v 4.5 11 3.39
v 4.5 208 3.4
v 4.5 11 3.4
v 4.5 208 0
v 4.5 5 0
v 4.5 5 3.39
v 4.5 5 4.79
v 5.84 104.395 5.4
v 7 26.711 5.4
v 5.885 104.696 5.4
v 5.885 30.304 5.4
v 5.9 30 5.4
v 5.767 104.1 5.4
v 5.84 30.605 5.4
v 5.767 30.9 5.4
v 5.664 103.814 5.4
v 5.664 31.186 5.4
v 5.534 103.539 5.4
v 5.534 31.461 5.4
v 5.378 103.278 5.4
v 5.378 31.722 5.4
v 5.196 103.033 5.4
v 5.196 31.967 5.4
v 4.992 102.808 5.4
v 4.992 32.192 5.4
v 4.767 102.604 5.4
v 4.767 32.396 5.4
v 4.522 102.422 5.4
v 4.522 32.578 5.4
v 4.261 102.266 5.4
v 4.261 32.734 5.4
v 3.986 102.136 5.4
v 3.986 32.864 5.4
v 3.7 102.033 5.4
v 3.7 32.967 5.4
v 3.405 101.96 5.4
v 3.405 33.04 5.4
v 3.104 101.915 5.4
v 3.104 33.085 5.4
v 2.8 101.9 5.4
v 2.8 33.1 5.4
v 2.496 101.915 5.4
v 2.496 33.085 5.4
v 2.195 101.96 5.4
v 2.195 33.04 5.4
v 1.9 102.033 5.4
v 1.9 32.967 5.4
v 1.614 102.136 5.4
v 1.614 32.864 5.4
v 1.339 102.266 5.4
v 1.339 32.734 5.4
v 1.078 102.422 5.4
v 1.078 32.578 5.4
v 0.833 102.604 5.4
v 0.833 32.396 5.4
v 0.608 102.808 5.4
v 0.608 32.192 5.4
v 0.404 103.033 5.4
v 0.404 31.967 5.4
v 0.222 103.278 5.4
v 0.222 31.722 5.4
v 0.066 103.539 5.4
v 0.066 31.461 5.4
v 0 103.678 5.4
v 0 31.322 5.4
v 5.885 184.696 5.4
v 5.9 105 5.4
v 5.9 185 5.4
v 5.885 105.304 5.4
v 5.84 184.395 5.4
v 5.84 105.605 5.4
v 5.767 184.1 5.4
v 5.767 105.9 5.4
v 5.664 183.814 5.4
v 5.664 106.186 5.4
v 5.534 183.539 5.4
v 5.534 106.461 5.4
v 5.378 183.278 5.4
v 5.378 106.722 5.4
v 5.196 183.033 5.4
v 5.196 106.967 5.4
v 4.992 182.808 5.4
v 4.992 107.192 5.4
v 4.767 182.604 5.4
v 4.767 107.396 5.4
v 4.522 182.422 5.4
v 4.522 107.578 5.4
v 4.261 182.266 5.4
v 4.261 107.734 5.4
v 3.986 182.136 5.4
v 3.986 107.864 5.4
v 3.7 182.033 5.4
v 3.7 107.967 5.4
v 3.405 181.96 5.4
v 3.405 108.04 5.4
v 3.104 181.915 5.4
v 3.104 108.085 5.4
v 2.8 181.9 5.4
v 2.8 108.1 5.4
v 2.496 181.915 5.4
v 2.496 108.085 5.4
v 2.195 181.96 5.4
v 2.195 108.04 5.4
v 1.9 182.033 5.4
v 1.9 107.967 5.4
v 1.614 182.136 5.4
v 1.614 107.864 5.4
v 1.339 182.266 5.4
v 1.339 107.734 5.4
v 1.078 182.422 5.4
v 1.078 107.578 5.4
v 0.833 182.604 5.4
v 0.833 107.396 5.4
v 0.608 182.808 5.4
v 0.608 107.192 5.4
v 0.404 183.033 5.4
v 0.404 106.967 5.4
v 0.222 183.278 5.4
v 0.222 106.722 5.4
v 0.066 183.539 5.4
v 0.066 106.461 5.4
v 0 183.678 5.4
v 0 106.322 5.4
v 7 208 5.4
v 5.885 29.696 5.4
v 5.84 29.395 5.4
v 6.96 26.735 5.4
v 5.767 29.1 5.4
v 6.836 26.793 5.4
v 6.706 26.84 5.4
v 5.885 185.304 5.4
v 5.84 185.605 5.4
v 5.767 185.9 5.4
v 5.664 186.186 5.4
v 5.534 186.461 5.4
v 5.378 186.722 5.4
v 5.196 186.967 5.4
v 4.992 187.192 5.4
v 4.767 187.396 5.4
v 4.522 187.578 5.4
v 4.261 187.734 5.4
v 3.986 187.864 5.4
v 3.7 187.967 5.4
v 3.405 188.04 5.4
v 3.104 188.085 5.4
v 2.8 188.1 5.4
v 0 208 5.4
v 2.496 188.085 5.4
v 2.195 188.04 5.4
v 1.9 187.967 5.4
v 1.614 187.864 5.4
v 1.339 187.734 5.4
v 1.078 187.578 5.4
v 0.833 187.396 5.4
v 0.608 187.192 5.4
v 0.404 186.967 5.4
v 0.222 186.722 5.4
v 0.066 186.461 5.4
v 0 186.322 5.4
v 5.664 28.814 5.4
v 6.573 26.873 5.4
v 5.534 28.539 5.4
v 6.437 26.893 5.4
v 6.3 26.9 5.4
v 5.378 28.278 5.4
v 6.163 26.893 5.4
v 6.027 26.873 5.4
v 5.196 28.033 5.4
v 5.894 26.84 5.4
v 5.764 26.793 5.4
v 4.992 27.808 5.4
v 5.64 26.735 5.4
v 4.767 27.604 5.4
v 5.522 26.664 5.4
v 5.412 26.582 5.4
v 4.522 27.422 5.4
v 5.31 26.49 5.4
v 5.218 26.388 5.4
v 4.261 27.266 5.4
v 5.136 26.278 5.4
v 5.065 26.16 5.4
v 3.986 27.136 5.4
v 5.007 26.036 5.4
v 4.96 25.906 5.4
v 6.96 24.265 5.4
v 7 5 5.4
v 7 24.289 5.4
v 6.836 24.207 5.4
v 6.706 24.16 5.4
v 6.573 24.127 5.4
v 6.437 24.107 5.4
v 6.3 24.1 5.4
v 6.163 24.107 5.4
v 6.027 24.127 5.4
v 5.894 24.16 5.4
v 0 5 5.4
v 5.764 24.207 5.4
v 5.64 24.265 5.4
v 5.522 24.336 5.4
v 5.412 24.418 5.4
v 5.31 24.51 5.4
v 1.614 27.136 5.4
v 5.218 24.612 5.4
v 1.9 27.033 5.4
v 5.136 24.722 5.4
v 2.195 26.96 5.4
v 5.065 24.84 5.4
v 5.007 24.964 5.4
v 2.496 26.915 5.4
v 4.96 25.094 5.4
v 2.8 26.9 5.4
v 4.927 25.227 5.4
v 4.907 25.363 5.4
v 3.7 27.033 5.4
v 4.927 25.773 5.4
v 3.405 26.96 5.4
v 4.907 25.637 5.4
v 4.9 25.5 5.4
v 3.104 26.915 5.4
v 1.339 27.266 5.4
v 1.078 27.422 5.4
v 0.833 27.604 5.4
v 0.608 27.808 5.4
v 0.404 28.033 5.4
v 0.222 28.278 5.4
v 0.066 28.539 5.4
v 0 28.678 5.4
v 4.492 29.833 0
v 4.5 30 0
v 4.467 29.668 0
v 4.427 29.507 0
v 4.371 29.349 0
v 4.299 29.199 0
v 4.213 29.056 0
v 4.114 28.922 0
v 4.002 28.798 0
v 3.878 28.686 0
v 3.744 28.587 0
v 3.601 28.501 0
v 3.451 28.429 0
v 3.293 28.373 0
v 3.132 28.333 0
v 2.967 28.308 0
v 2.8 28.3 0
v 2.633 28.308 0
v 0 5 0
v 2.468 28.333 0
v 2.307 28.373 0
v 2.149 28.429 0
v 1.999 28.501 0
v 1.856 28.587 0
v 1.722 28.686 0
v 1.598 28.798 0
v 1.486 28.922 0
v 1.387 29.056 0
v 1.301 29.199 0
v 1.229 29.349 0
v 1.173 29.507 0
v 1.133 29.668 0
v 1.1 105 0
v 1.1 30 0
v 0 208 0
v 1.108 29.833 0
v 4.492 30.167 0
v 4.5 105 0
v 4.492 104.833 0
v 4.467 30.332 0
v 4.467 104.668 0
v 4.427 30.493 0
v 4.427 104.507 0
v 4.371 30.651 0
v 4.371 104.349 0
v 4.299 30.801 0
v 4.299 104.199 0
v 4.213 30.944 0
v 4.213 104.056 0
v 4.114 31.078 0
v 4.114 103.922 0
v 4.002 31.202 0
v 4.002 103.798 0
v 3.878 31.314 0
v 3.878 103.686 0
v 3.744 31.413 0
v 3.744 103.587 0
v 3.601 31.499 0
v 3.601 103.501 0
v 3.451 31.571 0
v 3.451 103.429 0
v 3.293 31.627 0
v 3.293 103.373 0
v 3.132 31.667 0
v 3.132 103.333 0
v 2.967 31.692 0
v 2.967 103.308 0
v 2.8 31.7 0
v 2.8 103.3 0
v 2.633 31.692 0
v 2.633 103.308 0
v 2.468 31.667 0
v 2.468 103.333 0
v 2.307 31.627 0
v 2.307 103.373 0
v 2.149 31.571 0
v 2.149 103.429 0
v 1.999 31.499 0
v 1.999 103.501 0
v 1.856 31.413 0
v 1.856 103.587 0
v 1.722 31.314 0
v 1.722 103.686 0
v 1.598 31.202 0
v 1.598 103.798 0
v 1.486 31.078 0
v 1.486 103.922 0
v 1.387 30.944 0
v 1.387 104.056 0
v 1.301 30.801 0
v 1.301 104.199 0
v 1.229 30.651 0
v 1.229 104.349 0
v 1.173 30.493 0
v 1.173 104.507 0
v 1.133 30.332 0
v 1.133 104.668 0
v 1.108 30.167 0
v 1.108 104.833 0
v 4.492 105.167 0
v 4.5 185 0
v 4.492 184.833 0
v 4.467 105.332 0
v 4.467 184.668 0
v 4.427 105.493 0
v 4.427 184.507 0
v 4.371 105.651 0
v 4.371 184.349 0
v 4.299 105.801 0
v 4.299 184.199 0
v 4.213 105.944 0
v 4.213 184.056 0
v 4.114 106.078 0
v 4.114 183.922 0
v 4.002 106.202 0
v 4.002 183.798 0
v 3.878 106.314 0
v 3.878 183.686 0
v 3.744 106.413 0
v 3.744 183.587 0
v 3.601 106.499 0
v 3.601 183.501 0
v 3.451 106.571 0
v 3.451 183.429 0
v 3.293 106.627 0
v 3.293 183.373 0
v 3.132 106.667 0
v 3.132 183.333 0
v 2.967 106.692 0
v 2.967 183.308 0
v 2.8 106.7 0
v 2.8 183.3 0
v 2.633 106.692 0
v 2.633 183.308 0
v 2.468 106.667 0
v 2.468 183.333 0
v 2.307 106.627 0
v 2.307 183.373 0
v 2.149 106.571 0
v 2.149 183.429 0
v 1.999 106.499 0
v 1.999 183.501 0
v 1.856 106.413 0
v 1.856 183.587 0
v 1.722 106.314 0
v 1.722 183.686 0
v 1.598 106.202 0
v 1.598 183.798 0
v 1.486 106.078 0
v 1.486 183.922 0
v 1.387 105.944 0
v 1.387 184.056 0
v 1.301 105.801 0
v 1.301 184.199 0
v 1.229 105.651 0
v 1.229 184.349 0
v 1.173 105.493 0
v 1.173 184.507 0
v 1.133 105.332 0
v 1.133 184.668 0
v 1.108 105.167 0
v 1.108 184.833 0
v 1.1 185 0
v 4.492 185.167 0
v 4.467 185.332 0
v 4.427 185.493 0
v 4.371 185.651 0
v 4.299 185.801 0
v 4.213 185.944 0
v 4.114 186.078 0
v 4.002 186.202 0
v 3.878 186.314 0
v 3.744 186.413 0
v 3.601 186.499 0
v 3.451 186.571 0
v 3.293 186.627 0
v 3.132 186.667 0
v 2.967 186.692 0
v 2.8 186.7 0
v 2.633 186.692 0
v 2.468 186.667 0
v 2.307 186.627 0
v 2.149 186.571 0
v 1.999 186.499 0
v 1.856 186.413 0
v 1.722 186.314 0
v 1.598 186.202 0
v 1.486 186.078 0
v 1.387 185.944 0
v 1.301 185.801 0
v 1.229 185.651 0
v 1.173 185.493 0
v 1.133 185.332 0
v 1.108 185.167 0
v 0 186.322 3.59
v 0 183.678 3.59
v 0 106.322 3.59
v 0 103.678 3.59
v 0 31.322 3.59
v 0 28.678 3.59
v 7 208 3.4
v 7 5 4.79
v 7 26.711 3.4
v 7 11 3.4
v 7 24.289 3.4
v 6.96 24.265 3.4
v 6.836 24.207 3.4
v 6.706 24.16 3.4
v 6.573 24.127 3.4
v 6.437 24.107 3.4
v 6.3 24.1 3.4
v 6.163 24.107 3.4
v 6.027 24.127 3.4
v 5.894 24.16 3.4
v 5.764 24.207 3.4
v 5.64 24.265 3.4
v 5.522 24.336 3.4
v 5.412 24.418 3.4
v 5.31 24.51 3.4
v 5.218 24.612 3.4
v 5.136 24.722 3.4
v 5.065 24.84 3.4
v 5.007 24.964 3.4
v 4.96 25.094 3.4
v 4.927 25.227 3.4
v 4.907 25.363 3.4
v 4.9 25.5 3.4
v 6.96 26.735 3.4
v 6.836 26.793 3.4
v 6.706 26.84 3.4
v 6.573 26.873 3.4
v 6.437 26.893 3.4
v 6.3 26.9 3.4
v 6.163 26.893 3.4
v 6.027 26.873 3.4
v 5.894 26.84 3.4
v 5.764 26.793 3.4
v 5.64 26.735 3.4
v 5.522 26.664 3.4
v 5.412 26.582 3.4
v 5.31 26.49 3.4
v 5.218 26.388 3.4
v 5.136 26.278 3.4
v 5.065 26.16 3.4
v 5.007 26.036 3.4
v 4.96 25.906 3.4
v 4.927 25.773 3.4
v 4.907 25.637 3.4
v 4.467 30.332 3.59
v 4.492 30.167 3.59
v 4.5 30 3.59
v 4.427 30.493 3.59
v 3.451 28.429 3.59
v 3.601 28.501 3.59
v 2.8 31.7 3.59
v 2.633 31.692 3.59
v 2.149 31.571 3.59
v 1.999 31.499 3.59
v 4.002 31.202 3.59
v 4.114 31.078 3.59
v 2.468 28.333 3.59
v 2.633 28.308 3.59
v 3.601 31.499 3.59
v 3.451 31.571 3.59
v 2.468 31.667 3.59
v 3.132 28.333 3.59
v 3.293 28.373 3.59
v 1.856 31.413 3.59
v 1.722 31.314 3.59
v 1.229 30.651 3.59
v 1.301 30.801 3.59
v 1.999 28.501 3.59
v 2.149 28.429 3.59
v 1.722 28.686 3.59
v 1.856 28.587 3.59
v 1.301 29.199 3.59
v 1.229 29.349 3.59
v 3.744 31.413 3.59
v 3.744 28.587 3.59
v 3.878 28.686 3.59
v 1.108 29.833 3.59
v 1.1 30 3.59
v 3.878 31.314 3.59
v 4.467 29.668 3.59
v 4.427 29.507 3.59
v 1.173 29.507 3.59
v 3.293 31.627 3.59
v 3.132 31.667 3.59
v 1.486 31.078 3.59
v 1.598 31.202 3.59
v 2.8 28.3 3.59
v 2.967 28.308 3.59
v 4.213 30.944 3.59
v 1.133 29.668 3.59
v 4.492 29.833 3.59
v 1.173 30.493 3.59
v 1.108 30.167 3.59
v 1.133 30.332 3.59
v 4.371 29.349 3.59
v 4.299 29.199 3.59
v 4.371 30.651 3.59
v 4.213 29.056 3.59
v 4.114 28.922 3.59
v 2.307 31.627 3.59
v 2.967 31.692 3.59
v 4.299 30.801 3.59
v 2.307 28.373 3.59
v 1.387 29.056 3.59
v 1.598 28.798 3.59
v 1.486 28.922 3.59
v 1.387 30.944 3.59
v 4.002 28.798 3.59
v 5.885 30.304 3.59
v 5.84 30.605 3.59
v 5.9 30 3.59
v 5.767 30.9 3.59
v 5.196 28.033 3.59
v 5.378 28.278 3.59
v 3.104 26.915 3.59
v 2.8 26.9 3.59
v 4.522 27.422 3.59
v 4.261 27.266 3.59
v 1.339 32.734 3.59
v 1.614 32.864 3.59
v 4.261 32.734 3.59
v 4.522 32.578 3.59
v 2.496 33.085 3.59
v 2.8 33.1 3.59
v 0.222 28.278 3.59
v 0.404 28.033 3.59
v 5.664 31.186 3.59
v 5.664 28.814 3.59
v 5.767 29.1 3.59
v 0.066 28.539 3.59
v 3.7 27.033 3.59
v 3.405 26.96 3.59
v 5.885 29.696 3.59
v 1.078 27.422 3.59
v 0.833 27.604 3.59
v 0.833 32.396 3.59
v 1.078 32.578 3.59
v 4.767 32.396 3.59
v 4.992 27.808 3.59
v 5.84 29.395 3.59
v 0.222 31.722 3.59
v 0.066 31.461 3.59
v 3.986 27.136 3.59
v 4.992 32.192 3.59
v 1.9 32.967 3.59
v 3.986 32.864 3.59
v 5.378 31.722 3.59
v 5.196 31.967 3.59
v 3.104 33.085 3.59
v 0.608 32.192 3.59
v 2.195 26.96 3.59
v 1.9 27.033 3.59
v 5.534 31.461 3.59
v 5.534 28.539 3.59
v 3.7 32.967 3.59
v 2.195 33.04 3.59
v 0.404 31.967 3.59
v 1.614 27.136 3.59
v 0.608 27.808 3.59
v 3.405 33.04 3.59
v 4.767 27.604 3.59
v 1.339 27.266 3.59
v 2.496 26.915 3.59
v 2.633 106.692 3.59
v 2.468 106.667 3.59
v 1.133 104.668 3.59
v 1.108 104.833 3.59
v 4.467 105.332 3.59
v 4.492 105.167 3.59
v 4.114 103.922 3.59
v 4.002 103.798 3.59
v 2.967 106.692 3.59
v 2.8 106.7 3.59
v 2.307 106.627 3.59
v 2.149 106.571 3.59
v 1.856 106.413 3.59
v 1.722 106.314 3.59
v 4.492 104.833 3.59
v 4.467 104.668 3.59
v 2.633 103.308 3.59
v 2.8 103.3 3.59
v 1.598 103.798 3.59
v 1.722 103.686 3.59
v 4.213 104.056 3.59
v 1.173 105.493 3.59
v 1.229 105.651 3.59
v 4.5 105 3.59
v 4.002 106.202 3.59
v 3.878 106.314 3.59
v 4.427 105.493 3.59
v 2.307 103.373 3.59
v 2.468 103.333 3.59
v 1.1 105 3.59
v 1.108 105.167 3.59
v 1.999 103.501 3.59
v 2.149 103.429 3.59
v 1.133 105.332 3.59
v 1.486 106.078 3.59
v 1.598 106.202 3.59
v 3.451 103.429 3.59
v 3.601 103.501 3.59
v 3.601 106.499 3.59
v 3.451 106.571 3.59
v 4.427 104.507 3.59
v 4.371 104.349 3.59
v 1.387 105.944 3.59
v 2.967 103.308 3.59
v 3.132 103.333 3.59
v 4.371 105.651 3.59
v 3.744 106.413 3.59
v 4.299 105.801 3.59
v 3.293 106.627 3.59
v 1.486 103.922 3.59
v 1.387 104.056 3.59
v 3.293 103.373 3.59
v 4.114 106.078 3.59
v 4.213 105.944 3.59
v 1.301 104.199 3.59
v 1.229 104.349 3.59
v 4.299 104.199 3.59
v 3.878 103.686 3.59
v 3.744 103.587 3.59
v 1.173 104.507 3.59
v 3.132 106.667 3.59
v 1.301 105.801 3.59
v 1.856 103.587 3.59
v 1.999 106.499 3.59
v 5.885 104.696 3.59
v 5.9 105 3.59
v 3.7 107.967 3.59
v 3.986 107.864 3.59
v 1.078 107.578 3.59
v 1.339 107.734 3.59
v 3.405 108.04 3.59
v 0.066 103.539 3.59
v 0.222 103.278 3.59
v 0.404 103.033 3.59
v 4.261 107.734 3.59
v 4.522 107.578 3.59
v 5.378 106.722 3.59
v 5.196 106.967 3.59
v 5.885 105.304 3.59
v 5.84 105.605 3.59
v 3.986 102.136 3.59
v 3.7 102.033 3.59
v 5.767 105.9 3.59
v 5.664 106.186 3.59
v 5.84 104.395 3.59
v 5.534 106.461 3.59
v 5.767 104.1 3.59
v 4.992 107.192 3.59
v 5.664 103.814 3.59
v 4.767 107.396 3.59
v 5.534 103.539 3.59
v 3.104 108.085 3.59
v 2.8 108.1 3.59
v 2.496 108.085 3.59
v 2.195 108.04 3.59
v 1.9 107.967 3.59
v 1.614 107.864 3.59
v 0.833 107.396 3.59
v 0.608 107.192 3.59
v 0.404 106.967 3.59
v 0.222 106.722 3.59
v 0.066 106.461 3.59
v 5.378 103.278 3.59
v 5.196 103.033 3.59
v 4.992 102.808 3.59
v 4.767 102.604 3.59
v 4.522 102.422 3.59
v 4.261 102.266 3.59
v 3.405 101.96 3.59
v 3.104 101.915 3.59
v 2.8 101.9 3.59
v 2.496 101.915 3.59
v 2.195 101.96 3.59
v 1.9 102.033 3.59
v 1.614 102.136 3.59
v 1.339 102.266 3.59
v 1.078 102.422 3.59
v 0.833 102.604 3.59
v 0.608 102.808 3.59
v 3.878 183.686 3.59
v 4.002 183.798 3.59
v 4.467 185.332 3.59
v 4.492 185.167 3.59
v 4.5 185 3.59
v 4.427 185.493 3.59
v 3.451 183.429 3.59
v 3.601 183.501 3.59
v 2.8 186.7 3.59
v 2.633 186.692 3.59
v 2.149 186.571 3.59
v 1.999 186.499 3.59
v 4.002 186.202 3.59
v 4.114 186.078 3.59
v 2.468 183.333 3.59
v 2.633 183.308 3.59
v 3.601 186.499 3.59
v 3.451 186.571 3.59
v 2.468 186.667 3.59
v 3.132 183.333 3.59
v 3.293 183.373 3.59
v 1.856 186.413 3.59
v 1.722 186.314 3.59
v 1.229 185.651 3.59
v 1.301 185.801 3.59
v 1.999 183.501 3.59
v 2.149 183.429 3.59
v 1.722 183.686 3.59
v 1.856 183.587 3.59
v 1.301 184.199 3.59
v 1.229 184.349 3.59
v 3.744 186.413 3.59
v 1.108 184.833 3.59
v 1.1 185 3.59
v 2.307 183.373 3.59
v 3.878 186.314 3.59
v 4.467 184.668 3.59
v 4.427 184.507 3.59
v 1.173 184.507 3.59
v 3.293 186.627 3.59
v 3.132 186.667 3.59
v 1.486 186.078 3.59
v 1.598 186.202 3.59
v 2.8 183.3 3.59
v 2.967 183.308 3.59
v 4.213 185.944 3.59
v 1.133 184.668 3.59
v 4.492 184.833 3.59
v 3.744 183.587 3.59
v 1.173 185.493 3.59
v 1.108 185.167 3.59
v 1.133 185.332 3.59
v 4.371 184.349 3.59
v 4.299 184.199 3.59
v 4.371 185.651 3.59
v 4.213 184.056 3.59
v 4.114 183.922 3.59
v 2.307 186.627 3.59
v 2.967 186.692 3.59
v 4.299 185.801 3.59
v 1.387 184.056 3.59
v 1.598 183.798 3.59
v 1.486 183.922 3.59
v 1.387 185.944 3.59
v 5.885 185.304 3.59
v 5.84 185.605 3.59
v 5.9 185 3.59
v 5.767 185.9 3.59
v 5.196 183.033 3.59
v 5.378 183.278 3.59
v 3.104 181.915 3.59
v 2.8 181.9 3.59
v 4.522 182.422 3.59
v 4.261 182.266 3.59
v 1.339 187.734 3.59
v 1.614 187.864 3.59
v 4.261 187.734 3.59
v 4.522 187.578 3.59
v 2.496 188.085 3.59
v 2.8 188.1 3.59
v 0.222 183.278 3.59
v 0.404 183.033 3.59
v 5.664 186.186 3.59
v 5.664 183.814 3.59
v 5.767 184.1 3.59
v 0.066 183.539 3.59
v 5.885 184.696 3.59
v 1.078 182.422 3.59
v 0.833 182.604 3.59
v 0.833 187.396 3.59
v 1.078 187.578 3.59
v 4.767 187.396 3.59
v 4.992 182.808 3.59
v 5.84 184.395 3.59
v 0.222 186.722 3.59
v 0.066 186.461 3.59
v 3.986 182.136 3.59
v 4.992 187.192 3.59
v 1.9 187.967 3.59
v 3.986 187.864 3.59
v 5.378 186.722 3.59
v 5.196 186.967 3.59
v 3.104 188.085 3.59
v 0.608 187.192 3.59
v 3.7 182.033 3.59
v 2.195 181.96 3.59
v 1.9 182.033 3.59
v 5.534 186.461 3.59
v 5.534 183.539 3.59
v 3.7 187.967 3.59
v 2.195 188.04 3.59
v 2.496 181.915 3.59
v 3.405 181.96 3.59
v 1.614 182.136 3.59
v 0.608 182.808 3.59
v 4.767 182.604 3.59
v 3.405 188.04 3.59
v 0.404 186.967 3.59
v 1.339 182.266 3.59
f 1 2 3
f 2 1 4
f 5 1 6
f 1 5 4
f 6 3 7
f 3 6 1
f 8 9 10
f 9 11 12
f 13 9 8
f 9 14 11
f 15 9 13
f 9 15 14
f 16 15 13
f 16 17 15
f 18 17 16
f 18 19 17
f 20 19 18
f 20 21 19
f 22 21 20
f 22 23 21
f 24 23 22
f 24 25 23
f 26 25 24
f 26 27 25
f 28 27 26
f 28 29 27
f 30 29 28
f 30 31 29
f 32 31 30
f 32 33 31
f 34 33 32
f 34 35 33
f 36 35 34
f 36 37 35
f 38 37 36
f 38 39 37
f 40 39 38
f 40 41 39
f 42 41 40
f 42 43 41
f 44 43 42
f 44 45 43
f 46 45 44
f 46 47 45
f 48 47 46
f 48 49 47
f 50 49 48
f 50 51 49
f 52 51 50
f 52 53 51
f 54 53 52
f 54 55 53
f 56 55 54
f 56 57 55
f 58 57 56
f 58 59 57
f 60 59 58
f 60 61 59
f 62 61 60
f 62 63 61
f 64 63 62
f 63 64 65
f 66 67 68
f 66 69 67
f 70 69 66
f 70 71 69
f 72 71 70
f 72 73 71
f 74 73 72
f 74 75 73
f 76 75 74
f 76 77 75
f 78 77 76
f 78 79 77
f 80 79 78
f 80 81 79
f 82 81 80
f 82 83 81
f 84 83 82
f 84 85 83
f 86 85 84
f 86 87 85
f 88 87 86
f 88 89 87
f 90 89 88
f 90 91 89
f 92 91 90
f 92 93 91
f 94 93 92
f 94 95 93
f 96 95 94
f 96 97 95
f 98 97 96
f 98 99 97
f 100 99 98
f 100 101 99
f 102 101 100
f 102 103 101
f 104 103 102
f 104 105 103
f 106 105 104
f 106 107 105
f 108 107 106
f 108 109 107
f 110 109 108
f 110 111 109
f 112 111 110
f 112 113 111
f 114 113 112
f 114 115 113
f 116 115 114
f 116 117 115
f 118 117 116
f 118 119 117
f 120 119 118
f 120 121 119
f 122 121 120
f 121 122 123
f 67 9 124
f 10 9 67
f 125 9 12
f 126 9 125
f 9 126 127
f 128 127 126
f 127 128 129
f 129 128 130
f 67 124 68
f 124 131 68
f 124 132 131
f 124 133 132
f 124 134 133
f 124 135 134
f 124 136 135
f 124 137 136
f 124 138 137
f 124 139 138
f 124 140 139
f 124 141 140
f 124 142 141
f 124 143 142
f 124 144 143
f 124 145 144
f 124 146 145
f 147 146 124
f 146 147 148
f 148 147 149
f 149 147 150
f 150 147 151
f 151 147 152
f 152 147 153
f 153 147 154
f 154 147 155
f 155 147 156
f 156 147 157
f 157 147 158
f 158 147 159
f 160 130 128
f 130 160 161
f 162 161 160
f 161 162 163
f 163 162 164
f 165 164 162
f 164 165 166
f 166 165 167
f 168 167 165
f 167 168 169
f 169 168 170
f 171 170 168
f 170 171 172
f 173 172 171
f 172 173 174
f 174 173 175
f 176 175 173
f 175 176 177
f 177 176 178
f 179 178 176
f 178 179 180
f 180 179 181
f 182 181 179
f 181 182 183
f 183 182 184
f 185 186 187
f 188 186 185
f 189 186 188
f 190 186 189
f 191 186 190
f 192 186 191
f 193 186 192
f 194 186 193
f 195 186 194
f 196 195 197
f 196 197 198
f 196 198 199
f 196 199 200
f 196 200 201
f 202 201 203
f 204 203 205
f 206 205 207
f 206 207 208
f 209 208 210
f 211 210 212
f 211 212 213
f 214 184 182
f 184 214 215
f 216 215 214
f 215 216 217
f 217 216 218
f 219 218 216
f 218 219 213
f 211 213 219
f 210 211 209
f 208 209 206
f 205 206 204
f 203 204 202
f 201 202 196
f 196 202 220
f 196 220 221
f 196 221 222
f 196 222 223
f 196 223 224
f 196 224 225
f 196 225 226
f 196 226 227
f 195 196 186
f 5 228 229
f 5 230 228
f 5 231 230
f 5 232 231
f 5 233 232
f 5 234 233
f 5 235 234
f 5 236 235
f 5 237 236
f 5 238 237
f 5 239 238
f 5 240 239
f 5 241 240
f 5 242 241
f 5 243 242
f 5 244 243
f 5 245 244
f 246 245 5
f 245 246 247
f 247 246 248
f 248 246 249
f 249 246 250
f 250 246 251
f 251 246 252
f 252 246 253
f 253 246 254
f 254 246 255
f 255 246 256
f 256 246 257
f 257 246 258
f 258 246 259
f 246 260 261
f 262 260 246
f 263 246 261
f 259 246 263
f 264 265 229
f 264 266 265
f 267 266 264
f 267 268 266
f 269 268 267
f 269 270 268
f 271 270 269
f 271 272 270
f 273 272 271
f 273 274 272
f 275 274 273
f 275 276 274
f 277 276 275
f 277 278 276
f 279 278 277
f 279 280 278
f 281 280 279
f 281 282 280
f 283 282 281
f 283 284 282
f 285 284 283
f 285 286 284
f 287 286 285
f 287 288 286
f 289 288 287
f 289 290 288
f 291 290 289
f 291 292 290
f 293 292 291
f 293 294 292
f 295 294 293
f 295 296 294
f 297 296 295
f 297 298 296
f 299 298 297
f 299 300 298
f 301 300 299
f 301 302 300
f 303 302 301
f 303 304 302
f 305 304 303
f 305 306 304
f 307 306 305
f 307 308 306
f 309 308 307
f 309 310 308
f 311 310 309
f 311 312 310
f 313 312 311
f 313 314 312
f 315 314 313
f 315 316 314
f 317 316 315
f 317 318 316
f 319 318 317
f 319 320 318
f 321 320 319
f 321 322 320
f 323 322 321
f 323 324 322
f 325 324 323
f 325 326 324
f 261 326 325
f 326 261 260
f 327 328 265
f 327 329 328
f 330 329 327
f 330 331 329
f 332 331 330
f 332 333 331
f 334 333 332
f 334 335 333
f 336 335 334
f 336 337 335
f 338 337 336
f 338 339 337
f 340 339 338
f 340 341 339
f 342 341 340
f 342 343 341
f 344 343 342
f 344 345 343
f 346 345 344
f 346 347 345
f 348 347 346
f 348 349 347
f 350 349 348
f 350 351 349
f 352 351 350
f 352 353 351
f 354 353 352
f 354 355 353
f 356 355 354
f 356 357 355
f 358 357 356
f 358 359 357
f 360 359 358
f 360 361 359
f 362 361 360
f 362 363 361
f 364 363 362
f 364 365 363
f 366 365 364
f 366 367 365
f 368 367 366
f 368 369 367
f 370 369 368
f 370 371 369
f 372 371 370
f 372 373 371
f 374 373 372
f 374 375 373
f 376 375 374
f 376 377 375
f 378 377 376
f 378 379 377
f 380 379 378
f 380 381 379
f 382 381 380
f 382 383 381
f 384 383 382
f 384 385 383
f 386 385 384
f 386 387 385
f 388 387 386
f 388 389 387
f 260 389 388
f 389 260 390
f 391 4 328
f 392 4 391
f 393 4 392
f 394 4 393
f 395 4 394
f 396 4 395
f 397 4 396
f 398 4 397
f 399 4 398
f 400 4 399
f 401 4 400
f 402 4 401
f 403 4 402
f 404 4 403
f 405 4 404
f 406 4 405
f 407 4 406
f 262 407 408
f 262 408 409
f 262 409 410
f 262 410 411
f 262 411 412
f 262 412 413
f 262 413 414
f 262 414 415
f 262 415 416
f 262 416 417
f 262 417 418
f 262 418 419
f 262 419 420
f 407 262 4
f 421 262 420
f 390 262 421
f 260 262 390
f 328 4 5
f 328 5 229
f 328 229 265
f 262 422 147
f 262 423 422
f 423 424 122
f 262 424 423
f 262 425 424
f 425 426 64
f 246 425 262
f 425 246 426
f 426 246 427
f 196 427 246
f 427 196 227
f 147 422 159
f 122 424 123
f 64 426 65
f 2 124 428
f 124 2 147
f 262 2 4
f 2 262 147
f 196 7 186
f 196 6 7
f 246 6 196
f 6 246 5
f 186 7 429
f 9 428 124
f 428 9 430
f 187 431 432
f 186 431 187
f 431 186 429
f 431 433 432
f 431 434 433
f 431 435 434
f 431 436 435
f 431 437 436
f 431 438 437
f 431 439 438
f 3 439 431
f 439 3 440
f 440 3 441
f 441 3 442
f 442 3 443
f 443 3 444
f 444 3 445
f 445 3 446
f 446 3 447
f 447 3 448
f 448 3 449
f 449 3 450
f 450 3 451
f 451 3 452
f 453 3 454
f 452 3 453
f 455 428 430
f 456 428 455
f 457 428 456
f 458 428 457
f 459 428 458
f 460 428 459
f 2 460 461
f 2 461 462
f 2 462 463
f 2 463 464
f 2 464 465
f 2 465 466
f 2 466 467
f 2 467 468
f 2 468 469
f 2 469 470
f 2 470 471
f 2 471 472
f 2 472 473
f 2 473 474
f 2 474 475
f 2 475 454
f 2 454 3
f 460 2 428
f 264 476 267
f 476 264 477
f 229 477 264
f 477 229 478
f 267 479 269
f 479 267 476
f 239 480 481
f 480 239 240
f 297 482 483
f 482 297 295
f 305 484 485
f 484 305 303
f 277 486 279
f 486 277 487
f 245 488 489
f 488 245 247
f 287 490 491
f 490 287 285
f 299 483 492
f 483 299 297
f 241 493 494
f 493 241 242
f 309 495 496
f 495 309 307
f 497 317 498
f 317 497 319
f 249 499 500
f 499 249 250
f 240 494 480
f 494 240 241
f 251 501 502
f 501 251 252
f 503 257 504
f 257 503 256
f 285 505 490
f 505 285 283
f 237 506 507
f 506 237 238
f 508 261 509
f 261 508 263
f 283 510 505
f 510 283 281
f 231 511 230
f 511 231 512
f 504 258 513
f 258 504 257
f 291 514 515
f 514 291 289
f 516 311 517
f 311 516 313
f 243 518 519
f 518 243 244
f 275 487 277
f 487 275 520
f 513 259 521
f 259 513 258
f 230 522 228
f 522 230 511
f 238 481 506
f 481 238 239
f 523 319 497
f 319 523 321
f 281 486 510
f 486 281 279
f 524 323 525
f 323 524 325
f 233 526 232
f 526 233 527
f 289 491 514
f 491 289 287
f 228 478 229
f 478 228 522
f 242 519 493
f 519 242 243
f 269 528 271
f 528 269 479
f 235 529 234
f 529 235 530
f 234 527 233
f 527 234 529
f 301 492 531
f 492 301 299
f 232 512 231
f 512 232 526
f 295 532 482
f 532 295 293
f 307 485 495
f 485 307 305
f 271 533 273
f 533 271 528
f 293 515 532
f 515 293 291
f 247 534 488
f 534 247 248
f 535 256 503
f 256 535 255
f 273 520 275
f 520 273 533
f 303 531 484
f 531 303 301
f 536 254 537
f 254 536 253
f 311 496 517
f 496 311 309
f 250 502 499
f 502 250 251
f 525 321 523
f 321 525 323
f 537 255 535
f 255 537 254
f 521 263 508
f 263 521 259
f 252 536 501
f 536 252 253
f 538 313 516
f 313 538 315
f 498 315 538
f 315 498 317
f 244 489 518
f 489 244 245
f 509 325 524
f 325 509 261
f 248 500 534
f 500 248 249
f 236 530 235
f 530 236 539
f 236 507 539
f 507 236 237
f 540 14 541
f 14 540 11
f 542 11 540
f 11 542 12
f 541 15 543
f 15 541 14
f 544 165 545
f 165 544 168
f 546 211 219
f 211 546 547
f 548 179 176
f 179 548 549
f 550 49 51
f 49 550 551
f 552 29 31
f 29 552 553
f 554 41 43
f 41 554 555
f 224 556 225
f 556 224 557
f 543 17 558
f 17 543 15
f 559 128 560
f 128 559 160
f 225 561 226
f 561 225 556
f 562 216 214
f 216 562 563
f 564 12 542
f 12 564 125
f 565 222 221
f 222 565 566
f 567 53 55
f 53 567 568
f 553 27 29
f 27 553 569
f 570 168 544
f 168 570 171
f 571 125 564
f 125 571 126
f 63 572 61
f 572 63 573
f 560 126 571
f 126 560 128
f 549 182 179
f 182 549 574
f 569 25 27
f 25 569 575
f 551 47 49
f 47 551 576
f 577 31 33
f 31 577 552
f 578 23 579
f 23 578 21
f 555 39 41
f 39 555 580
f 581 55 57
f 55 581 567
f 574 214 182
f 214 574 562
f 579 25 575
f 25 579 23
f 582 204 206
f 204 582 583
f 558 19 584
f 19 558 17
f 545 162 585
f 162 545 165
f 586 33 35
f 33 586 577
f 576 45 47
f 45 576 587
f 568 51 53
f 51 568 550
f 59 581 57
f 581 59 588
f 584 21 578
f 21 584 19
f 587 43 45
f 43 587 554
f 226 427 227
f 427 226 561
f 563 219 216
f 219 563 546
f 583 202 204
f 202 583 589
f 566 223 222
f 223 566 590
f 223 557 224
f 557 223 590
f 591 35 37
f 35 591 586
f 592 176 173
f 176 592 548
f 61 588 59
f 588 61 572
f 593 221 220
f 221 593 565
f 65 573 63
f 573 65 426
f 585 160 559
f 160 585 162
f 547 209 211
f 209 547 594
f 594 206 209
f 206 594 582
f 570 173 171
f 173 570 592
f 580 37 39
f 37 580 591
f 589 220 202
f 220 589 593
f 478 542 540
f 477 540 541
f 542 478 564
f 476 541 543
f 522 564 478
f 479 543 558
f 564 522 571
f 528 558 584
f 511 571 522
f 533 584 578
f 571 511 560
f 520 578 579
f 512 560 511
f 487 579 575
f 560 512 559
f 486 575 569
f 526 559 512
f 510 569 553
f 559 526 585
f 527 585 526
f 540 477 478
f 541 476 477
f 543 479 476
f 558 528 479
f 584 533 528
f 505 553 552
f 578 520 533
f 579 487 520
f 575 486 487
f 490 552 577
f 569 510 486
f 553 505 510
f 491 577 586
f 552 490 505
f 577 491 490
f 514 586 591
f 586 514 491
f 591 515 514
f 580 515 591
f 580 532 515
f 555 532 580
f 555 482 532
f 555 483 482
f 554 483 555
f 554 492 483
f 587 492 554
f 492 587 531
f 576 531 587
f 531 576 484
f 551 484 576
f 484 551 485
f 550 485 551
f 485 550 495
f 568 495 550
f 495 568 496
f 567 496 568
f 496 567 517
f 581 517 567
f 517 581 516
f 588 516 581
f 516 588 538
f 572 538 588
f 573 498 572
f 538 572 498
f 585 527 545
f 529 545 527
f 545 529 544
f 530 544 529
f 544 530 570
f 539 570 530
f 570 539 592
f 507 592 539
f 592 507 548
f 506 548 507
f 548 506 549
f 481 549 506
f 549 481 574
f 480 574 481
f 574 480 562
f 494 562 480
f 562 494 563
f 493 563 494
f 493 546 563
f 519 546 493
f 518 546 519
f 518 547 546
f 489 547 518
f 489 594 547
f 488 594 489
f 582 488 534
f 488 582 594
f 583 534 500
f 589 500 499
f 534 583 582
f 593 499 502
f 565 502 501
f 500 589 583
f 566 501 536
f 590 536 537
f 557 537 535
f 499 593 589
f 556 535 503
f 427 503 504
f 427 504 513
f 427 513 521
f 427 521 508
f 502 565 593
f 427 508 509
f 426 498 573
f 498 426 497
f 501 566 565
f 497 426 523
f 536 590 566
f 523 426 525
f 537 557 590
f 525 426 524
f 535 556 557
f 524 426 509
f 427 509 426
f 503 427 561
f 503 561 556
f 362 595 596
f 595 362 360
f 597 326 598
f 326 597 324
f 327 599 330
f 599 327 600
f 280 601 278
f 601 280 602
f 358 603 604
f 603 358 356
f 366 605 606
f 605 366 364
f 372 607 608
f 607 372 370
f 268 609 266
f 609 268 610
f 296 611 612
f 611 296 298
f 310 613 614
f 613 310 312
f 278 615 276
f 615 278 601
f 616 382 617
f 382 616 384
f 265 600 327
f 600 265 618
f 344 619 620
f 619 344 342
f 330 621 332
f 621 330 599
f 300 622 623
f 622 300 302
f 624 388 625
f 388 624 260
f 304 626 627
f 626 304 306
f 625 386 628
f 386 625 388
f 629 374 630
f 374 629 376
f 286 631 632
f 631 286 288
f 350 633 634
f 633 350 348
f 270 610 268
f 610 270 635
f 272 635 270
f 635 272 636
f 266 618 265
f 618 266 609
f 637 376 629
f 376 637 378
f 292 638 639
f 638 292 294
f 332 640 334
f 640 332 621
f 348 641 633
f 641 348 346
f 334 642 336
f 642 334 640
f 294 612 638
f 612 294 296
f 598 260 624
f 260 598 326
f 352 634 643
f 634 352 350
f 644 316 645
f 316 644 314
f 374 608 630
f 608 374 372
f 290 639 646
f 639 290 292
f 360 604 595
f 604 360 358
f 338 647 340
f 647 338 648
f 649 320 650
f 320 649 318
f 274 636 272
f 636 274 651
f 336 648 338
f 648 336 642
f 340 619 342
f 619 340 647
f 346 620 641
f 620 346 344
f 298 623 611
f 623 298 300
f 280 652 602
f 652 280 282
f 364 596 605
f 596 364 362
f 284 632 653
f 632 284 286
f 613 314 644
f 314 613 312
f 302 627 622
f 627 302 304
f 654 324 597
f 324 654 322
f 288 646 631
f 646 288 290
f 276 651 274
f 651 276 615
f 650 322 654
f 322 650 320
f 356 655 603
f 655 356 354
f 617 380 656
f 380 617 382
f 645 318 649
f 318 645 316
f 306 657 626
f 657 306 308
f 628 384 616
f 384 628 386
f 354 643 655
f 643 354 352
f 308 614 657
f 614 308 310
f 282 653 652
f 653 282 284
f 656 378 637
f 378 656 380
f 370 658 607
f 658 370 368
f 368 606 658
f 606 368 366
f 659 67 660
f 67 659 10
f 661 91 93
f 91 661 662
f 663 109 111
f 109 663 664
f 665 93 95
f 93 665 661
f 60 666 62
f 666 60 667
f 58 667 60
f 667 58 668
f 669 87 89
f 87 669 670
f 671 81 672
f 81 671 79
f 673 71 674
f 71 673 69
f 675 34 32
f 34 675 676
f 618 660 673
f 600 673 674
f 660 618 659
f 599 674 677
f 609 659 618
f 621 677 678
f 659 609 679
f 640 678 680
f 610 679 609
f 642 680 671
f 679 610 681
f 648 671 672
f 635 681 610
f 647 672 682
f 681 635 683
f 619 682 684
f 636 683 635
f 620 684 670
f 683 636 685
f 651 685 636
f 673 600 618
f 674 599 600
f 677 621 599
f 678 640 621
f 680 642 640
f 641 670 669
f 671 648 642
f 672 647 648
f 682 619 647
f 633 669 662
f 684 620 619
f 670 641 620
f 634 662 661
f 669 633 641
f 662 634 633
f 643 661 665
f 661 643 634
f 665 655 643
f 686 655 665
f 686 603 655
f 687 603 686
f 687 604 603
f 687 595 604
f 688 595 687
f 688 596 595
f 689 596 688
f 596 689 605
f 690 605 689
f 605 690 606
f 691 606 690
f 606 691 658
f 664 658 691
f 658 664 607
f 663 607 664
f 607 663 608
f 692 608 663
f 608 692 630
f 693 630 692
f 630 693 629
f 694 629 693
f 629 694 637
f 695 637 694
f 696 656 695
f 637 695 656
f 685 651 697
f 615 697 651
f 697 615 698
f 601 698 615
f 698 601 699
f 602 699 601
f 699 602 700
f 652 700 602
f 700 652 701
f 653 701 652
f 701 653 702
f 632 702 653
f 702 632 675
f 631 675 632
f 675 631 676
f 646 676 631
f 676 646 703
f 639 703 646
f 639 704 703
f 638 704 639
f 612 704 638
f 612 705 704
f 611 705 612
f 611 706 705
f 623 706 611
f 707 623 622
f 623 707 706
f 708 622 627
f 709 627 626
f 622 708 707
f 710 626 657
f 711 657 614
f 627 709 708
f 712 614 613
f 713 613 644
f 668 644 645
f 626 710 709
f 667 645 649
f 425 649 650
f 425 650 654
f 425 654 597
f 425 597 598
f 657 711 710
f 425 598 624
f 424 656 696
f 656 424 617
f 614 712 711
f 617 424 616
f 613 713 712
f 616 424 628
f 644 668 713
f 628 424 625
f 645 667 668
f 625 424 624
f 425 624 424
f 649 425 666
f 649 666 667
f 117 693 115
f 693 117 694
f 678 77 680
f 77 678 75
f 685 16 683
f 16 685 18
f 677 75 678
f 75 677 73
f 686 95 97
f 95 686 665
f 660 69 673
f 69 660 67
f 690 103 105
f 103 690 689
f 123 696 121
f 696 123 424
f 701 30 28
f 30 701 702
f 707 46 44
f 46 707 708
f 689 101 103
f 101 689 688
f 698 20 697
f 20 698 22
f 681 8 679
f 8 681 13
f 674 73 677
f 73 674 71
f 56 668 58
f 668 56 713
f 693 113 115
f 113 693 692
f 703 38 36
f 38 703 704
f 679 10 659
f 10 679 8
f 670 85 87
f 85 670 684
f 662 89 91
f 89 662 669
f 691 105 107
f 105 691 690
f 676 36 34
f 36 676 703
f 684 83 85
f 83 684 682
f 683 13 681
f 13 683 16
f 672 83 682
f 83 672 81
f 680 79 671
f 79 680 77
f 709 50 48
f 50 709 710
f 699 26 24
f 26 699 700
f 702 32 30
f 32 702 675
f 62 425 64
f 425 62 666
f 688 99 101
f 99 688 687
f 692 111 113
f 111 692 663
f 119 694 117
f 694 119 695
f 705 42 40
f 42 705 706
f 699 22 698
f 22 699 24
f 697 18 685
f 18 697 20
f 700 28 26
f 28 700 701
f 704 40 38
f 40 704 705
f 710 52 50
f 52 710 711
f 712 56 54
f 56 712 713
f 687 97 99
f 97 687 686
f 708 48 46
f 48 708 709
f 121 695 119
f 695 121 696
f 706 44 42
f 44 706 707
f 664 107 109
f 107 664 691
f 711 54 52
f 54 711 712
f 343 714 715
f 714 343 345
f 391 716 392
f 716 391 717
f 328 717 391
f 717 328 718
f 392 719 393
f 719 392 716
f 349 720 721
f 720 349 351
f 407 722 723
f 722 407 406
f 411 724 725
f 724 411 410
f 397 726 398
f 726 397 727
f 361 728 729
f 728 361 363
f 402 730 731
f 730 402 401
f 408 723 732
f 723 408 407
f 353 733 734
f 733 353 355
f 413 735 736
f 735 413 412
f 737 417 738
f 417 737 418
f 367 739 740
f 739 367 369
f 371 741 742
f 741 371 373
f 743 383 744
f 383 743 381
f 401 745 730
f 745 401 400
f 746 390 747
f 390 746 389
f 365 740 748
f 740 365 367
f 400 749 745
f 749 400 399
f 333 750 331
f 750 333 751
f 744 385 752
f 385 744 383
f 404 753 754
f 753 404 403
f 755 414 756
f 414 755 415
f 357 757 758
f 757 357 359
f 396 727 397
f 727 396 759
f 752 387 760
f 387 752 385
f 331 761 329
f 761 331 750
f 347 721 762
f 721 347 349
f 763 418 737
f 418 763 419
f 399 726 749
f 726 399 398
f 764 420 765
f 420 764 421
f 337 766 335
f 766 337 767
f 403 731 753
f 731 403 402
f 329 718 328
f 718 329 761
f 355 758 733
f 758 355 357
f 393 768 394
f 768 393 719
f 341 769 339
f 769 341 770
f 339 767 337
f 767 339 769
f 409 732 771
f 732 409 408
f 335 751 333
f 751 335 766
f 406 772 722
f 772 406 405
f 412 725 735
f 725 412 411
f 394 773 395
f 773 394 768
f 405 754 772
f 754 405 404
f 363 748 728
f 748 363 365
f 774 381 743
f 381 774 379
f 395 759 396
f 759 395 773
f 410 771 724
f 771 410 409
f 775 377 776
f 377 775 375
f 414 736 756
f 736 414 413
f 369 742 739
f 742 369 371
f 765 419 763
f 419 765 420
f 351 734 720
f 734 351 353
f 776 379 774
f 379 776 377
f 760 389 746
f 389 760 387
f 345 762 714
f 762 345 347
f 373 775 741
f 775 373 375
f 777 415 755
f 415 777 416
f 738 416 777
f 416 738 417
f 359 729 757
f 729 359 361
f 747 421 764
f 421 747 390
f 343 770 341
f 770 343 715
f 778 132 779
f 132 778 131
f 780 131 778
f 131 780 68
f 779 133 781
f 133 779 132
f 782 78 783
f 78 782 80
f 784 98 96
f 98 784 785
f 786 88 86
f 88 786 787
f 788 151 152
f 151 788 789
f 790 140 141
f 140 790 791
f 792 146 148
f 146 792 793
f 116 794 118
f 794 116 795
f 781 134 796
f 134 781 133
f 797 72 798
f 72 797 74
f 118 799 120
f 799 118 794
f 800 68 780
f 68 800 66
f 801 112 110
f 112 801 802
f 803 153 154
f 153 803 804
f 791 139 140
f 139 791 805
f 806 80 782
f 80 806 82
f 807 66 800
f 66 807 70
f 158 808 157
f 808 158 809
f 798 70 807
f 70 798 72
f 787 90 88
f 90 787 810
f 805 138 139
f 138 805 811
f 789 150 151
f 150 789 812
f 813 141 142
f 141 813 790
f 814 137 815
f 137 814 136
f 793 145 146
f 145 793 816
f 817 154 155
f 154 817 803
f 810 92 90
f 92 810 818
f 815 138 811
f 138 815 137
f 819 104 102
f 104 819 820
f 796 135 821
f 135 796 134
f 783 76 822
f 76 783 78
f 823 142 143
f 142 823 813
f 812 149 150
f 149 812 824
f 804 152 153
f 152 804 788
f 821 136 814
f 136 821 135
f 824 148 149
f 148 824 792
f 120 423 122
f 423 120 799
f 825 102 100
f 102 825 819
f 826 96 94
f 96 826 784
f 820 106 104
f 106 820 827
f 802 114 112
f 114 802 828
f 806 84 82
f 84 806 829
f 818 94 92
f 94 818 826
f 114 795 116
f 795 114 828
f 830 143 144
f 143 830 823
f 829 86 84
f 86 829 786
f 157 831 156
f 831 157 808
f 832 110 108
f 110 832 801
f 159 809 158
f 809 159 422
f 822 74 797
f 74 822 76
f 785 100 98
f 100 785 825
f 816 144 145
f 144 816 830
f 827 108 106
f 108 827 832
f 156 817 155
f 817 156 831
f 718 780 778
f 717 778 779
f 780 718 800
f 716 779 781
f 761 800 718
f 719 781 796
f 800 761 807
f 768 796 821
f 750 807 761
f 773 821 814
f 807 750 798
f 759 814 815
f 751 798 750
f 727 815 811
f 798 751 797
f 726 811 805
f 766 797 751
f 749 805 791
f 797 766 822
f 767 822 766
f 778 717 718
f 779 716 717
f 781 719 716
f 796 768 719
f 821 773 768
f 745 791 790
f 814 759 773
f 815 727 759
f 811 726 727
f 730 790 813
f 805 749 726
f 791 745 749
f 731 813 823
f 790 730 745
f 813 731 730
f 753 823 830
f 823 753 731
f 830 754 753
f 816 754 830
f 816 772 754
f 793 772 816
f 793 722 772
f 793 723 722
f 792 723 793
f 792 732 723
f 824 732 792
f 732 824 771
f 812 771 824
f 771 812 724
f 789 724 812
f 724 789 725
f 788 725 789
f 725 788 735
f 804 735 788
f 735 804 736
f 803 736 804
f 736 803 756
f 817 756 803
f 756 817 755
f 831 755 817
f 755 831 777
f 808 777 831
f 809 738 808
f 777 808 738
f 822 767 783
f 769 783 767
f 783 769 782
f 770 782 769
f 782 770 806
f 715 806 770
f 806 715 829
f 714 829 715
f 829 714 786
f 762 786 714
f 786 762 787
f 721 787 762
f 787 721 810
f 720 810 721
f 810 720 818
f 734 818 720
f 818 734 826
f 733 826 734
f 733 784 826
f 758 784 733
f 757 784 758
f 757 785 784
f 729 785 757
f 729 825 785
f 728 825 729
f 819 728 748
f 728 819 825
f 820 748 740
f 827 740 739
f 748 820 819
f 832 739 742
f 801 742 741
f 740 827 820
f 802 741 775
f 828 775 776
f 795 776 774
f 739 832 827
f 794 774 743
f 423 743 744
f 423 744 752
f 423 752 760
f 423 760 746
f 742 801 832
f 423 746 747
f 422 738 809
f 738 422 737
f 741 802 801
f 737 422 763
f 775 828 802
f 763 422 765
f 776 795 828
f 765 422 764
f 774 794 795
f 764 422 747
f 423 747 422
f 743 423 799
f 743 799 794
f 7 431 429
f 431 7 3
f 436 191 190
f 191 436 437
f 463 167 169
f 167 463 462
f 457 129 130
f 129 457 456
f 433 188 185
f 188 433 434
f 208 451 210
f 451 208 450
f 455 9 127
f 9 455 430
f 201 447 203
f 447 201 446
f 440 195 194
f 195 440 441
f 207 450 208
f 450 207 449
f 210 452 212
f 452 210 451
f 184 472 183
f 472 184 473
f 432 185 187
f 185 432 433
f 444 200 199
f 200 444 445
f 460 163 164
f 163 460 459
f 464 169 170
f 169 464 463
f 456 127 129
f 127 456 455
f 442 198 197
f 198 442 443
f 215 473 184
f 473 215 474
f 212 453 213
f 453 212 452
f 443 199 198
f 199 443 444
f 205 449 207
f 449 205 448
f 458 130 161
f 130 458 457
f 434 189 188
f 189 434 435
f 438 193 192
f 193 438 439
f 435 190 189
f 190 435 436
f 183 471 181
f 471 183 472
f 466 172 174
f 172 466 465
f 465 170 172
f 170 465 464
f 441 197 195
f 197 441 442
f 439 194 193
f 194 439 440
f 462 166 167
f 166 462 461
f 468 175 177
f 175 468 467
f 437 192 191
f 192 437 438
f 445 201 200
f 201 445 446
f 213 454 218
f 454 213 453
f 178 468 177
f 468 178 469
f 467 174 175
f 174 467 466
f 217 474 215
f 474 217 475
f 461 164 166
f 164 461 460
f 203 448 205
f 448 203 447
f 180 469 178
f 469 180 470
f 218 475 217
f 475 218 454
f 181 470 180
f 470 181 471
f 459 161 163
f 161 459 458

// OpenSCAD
// file: ../generated/config.scad
// GENERATED by tools/build.py from config/rack.yaml — do not edit.

FRAME_PROFILE = 20;
FRAME_W = 700;
FRAME_D = 225;
FRAME_TILT = 20;
FRAME_ROW_Y0 = 25;
FRAME_BRACKET = 10;
FRAME_INNER_X0 = 30;
FRAME_BASE_H = 80;
FRAME_FOOT_H = 10;
FRAME_TOP_Z = 760;
ROW_IDS = ["A", "B", "C", "D"];
ROW_HEIGHTS = [165, 165, 165, 185];
ROW_LAYOUTS = [[1, 1, 1, 1], [1, 1, 1, 1], [1, 1, 1, 1], [2, 2]];
BAY_PITCH = 160;
BAY_GAP = 2;
CARRIER_W = 158;
CARRIER_D = 210;
CARRIER_BOTTOM = 2.5;
CARRIER_WALL = 2;
CARRIER_STANDOFF = 5;
CARRIER_DECK = 3;
CARRIER_FASCIA = 2.5;
CARRIER_WALL_H = 20.1;
CARRIER_PLENUM = 23.1;
PCB_TO_FLOOR = 14;
CAM_MOUNT = [100, 60, 30];
DRAWER_D = 196;
DRAWER_W = 142;
DRAWER_X0 = 8;
DRAWER_TRAVEL = 140;
DRAWER_GUIDE_W = 7.5;
DRAWER_CLEAR = 0.5;
DRAWER_BOTTOM = 2.5;
DRAWER_WALL = 2;
DRAWER_WALL_H = 16;
DRAWER_FRONT_H = 30;
DRAWER_FRONT_T = 4;
DRAWER_REAR_BAY = 30;
DRAWER_FLANGE = [3, 3];
DRAWER_MAGNET = [6, 3];
PLATE_T = 2.5;
CHAIN_INNER = [7, 7];
CHAIN_OUTER = [11, 10];
CHAIN_R = 18;
CHAIN_FIXED = [104, 90];
CHAIN_MOVING_X = 140;
CHAIN_FOOT_Y = 172;
CHAIN_BEND_Y = 182;
NODE_SIZE = [64, 80];
NODE_T = 1.6;
NODE_HOLES = [[3.5, 3.5], [60.5, 3.5], [3.5, 76.5], [60.5, 76.5]];
NODE_X0 = 4;
NODE_FRONT_Y = 3;
NODE_PCB_TOP = 9.1;
NODE_FRONT = [32, 12, 50];
NODE_VH_Y = 64;
NODE_RIGHT = [24, 40];
NODE_CAM = [64, 11];
HUB_SIZE = [120, 70];
HUB_HOLES = [[4, 4], [116, 4], [4, 66], [116, 66]];
// file: ../lib/common.scad
// Shared helpers for every printed part of hw-testing-rack.
include <../generated/config.scad>

$fn = $preview ? 32 : 64;
EPS = 0.01;

// Heat-set inserts (Ruthex-style).  Hole Ø is the recommended pre-hole.
INSERT_M3 = [4.0, 5.7];    // [hole Ø, depth]
INSERT_M2 = [3.2, 4.0];
INSERT_M25 = [3.6, 4.5];
M3_CLEAR = 3.4;
M5_CLEAR = 5.5;
M3_HEAD = [6.0, 3.0];      // DIN 912 / ISO 7380 head Ø × height (button head ~5.7)

module rbox(size, r = 2, center = false) {
    // Box with rounded vertical edges.
    translate(center ? [-size[0] / 2, -size[1] / 2, 0] : [0, 0, 0])
        hull() for (x = [r, size[0] - r], y = [r, size[1] - r])
            translate([x, y, 0]) cylinder(r = r, h = size[2]);
}

module rslot(len, w, h) {
    // Stadium-shaped slot along X, centred on the origin.
    hull() for (x = [-(len - w) / 2, (len - w) / 2]) translate([x, 0, 0]) cylinder(d = w, h = h);
}

module insert_hole(spec = INSERT_M3) {
    // Pocket for a heat-set insert, opening at z=0 and going -Z.
    translate([0, 0, -spec[1]]) cylinder(d = spec[0], h = spec[1] + EPS);
    translate([0, 0, -0.6]) cylinder(d1 = spec[0], d2 = spec[0] + 0.8, h = 0.6 + EPS);
}

module screw_through(d = M3_CLEAR, h = 20, head = M3_HEAD, counterbore = true) {
    // Clearance hole along +Z from z=0, with an optional counterbore at z=h.
    translate([0, 0, -EPS]) cylinder(d = d, h = h + 2 * EPS);
    if (counterbore) translate([0, 0, h - head[1]]) cylinder(d = head[0] + 0.4, h = head[1] + EPS);
}

module magnet_pocket(d = DRAWER_MAGNET[0], t = DRAWER_MAGNET[1]) {
    // Press-fit/glue pocket for a disc magnet, opening at z=0 going -Z.
    translate([0, 0, -t - 0.2]) cylinder(d = d + 0.25, h = t + 0.2 + EPS);
}

module label_text(txt, size = 6, depth = 0.6, font = "Liberation Sans:style=Bold") {
    linear_extrude(depth) text(txt, size = size, font = font, halign = "center", valign = "center");
}

// 2020 B-type profile, simplified (good enough for previews and clearance checks).
module extrusion2020(len) {
    s = FRAME_PROFILE;
    difference() {
        translate([-s / 2, -s / 2, 0]) cube([s, s, len]);
        for (a = [0, 90, 180, 270]) rotate([0, 0, a])
            translate([s / 2 - 1.8, -3, -EPS]) {
                cube([1.8 + EPS, 6, len + 2 * EPS]);
                translate([-4.2, -2.6, 0]) cube([4.3, 11.2, len + 2 * EPS]);
            }
        translate([0, 0, -EPS]) cylinder(d = 4.2, h = len + 2 * EPS);
    }
}
// file: ../lib/carrier.scad
// Geometry shared by the carrier, deck, drawer, plates, chain parts and the assembly.
// All positions are in CARRIER coordinates (origin = front-left-bottom of one
// bay's carrier, X right, Y towards the back, Z up) unless stated otherwise.
include <common.scad>

WALL = CARRIER_WALL;
BOSS_D = 7.5;

// ---------------------------------------------------------------- bay node PCB
// KiCad coordinates on the node (y = 0 at the REAR edge) → carrier XY.
function node_xy(k) = [NODE_X0 + k[0], NODE_FRONT_Y + (NODE_SIZE[1] - k[1])];
NODE_REAR_Y = NODE_FRONT_Y + NODE_SIZE[1];
VH_NOTCH_Y = node_xy([0, NODE_VH_Y])[1];

// ---------------------------------------------------------------- deck fixings
// Side screws go guide → deck → base wall boss (one screw holds all three).
GUIDE_SCREW_X = 2.8;
function side_screws() = [for (y = [30, 105, 185]) for (x = [GUIDE_SCREW_X, CARRIER_W - GUIDE_SCREW_X]) [x, y]];
// Free-standing pillars under the deck middle (clear of the node and the chain).
function deck_pillars() = [[40, 165], [82, 165], [125, 75]];

// ---------------------------------------------------------------- drawer & guides
DRAWER_Y0 = 0;                                     // closed drawer front face
DRAWER_INNER_W = DRAWER_W - 2 * DRAWER_WALL;
DRAWER_PORT_WALL_Y = DRAWER_D - DRAWER_REAR_BAY;   // inner wall carrying the USB-C ports (drawer coords)
GUIDE_Y0 = DRAWER_FRONT_T + 1;
GUIDE_LIP_Z = DRAWER_FLANGE[1] + 0.4;              // lip underside above the deck
GUIDE_LIP_T = 2.0;
GUIDE_WALL_T = DRAWER_X0 - DRAWER_FLANGE[0] - 0.5;  // solid wall of the C-channel (inner face 0.5 from the flange)
STOP_PIN_X = DRAWER_X0 - DRAWER_FLANGE[0] / 2 - 0.2; // M2.5 stop screw, in the flange path
FLANGE_Y = [DRAWER_D - 26, DRAWER_D - 6];          // rear flange segment (drawer coords)
STOP_Y = FLANGE_Y[0] - DRAWER_TRAVEL - 4.5;        // stop pin position (carrier coords)
DETENT_DRAWER = [22, DRAWER_D - 14];               // magnet in drawer bottom (drawer coords)
DETENT_DECK = [DRAWER_X0 + DETENT_DRAWER[0], DETENT_DRAWER[1]];

// panel-mount USB-C (DATA) and a slot for the optional AUX (JST-SH) pigtail, on the port wall
PORT_X = [DRAWER_W * 0.38, DRAWER_W * 0.62];       // [DATA, AUX]
PORT_Z = DRAWER_BOTTOM + 7;
PORT_EARS = 26;                                    // M3 ear pitch of common panel-mount USB-C extensions

// drawer width for a bay spanning `span` units (wide bays share the node of their left unit)
function drawer_w(span) = span * BAY_PITCH - BAY_GAP - 2 * DRAWER_GUIDE_W - 2 * DRAWER_CLEAR;

// board plate (drops into the drawer between front panel and port wall)
function plate_w(span) = drawer_w(span) - 2 * DRAWER_WALL - 0.6;
PLATE_W = DRAWER_INNER_W - 0.6;
PLATE_D = DRAWER_PORT_WALL_Y - DRAWER_FRONT_T - 0.6;
PLATE_X0 = DRAWER_WALL + 0.3;                      // drawer coords
PLATE_Y0 = DRAWER_FRONT_T + 0.3;
function plate_pins() = [[10, 10], [PLATE_W - 10, PLATE_D - 10]];   // 180°-symmetric locating pins

// ---------------------------------------------------------------- drag chain
CHAIN_W = CHAIN_OUTER[0];                          // vertical extent when lying flat
CHAIN_H = CHAIN_OUTER[1];                          // horizontal extent (X) of one run
CHAIN_Z = CARRIER_BOTTOM + CHAIN_W / 2 + 0.6;      // centre line height in the plenum
CHAIN_FIXED_RUN_X = CHAIN_FIXED[0];
DECK_SLOT = [CHAIN_MOVING_X, CHAIN_FOOT_Y - DRAWER_TRAVEL - 7, CHAIN_FOOT_Y + 7];  // x, y0, y1
FOOT_HOLE = [CHAIN_MOVING_X - DRAWER_X0, CHAIN_FOOT_Y];                           // drawer coords

// ---------------------------------------------------------------- camera pod
CAM_CENTER = [CAM_MOUNT[0], CAM_MOUNT[1]];
function cam_inserts() = [for (x = [-1, 1], y = [-1, 1]) CAM_CENTER + [x, y] * CAM_MOUNT[2] / 2];
CAM_CABLE_HOLE = node_xy(NODE_CAM) + [7, 0];          // camera 5 V lead goes down here
// main file
// Drawer guide — left and right C-channel rails screwed on top of the deck.
//
//   openscad -D 'SIDE="left"'  -o drawer_guide_left.stl  parts/drawer_guide.scad
//   openscad -D 'SIDE="right"' -o drawer_guide_right.stl parts/drawer_guide.scad
//
// The lip captures the drawer's rear flange segment, so a drawer pulled out
// to its full 140 mm stroke cannot tip.  An M2.5×8 screw dropped through the
// lip hole near the front is the end stop; remove it to take the drawer out.
// The three M3×12 screws go guide → deck → carrier wall insert.
// Print: upside down (lip on the bed), PETG; POM-like "igus" filament if you have it.
include <../lib/carrier.scad>

SIDE = "left";
GUIDE_L = CARRIER_D - 2 - GUIDE_Y0;
GUIDE_H = GUIDE_LIP_Z + GUIDE_LIP_T;
LIP_X = DRAWER_X0 - 1.0;          // lip reaches over the flange, stops 1 mm short of the drawer side

module guide_left() {
    difference() {
        translate([0, GUIDE_Y0, 0]) union() {
            cube([GUIDE_WALL_T, GUIDE_L, GUIDE_H]);
            translate([0, 0, GUIDE_LIP_Z]) cube([LIP_X, GUIDE_L, GUIDE_LIP_T]);
        }
        // lead-in chamfer on the lip underside at the front
        translate([GUIDE_WALL_T, GUIDE_Y0 - EPS, GUIDE_LIP_Z - EPS])
            rotate([0, 0, 0]) hull() {
                cube([LIP_X - GUIDE_WALL_T + 1, EPS, 1.4]);
                translate([0, 6, 0]) cube([LIP_X - GUIDE_WALL_T + 1, EPS, EPS]);
            }
        // M3 screws with counterbore
        for (s = side_screws()) if (s[0] < CARRIER_W / 2) translate([s[0], s[1], -EPS]) {
            cylinder(d = M3_CLEAR, h = GUIDE_H + 1);
            translate([0, 0, GUIDE_H - 1.8]) cylinder(d = 6.2, h = 2);
        }
        // stop screw hole through the lip
        translate([STOP_PIN_X, STOP_Y, GUIDE_LIP_Z - 1]) cylinder(d = 2.8, h = GUIDE_LIP_T + 2);
    }
}

if (SIDE == "left") guide_left();
else translate([CARRIER_W, 0, 0]) mirror([1, 0, 0]) guide_left();
